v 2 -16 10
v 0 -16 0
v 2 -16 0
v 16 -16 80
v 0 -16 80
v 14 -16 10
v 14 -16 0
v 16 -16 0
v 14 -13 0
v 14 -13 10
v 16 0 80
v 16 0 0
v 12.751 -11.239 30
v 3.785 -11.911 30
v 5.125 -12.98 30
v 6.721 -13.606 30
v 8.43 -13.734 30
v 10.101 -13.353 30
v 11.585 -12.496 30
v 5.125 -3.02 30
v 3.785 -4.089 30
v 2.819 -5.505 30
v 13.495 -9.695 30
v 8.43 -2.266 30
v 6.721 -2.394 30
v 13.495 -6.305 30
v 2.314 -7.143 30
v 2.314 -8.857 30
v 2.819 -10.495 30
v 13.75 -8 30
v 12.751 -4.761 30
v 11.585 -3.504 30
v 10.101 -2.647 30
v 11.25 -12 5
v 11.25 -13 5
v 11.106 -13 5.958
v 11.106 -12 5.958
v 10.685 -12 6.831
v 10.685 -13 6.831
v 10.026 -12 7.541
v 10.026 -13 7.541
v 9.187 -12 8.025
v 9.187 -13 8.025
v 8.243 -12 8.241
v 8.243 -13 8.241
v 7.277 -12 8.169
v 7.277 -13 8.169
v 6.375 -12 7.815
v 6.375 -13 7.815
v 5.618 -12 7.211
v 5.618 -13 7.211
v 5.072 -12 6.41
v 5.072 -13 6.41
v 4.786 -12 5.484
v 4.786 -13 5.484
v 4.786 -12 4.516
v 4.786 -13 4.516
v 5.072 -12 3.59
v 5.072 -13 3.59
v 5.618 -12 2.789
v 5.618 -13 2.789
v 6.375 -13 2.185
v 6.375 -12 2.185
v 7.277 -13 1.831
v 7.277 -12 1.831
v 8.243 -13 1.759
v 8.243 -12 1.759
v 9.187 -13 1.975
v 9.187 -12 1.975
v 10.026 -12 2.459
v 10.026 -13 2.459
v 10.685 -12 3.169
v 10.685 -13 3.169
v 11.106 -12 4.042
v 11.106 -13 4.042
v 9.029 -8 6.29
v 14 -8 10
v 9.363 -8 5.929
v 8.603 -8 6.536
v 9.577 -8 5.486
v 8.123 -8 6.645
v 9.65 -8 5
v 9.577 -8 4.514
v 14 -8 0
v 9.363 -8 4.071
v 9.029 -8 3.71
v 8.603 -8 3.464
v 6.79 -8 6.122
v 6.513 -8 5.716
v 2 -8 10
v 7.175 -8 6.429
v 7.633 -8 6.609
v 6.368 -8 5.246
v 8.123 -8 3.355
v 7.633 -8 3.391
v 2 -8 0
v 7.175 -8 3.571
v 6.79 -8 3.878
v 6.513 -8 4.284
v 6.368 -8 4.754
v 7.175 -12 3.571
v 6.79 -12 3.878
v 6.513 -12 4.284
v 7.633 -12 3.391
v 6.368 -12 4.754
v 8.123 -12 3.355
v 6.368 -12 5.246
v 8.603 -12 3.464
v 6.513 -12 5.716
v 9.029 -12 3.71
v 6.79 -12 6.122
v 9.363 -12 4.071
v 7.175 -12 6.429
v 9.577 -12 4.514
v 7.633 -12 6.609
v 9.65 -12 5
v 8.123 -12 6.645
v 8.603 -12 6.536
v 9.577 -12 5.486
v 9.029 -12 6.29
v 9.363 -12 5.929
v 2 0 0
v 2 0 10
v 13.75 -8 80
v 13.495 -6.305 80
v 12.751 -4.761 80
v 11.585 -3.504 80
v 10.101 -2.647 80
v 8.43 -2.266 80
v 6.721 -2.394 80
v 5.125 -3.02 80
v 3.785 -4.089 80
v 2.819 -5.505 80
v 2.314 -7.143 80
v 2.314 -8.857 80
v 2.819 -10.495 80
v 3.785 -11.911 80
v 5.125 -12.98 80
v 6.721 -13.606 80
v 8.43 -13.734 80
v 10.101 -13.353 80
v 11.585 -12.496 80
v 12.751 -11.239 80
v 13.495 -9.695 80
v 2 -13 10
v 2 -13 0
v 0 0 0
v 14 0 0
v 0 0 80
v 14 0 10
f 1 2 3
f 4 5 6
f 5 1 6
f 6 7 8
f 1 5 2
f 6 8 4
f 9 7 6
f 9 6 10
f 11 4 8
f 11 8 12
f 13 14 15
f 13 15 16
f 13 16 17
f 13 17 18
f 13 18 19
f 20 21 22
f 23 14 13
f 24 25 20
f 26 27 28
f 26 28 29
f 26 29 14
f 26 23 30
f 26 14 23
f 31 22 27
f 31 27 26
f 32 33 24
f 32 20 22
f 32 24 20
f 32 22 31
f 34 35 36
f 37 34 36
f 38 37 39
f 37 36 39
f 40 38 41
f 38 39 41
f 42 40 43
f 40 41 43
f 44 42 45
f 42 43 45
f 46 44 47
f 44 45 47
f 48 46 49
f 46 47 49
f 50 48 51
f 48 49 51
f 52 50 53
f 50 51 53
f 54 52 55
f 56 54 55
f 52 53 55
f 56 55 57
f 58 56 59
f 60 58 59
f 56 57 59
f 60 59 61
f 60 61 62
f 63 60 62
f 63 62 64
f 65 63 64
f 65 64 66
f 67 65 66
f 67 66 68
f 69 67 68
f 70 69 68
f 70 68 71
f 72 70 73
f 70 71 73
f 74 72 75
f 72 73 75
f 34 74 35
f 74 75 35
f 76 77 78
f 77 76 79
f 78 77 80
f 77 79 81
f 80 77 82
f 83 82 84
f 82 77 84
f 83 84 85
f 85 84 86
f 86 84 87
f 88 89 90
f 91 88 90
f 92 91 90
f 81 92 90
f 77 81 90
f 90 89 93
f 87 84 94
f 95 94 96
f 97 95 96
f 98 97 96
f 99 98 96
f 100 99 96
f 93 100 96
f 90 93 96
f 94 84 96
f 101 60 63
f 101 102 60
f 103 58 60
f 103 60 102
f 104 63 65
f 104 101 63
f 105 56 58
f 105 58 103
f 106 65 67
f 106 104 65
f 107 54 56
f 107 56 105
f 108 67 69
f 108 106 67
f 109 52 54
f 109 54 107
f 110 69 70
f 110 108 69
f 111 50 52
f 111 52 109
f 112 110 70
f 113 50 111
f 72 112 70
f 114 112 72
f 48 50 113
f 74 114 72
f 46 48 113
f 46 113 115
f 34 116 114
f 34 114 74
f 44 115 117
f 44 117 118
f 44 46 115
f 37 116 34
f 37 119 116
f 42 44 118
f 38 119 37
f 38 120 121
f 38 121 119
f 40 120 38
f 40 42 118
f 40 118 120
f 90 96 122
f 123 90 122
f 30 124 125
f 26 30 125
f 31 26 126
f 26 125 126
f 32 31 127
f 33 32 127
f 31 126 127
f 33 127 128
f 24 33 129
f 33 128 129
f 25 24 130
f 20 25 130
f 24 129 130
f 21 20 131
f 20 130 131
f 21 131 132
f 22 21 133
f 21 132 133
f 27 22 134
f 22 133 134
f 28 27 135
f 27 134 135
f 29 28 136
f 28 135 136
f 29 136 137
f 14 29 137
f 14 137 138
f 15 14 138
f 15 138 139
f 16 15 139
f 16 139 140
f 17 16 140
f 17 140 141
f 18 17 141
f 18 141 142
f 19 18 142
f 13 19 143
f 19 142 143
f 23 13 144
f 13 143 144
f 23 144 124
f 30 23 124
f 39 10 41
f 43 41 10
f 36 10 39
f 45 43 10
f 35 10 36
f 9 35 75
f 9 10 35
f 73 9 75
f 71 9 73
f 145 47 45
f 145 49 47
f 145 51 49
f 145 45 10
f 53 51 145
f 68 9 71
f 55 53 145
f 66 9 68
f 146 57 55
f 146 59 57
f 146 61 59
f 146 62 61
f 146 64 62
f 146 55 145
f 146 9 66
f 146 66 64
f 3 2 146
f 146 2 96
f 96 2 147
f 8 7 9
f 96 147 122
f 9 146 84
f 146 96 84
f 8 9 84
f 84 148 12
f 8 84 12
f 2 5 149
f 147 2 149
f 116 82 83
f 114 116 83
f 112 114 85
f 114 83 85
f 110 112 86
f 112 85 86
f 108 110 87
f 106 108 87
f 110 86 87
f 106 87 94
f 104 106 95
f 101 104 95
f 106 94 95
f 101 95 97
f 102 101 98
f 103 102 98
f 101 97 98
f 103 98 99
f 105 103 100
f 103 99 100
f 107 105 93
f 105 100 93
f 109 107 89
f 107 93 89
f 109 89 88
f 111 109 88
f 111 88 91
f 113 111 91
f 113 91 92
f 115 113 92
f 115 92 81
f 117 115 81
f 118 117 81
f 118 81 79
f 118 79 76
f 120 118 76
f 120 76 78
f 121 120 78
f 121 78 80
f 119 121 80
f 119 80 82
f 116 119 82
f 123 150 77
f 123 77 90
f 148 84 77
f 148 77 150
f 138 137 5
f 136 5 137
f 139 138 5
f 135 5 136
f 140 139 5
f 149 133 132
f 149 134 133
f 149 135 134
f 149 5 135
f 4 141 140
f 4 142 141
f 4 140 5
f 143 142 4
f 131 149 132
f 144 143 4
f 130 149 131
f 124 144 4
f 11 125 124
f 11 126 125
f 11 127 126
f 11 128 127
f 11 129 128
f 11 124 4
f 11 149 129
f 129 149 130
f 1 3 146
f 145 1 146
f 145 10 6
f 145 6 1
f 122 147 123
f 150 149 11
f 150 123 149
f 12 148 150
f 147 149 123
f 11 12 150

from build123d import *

# Parameters (mm, degrees)
SKETCH_1_W             = 16
SKETCH_1_H             = 16
EXTRUDE_1_DEPTH        = 80
SKETCH_2_R             = 5.75
CUT_EXTRUDE_1_DEPTH    = 50
SKETCH_10_W            = 12
SKETCH_10_H            = 8
SKETCH_10_H_2          = 3
CUT_EXTRUDE_2_DEPTH    = 10
SKETCH_11_R            = 3.25
CUT_EXTRUDE_5_DEPTH    = 1
HOLE_WIZARD_M4_1_D     = 3.3
HOLE_WIZARD_M4_1_DEPTH = 4


with BuildPart() as part:
    # 草图1 → 凸台-拉伸1 (new body)
    with BuildSketch(Plane.XY):
        with Locations((8, -8)):
            Rectangle(SKETCH_1_W, SKETCH_1_H)
    extrude(amount=EXTRUDE_1_DEPTH)

    # 草图2 → 切除-拉伸1 (cut)
    with BuildSketch(Plane.XY.offset(80)):
        with Locations((8, -8)):
            Circle(SKETCH_2_R)
    extrude(amount=-CUT_EXTRUDE_1_DEPTH, mode=Mode.SUBTRACT)

    # 草图10 → 切除-拉伸2 (cut)
    with BuildSketch(Plane(origin=(0, 0, 0), x_dir=(-1, 0, 0), z_dir=(0, 0, -1))):
        with Locations((-8, -4)):
            Rectangle(SKETCH_10_W, SKETCH_10_H)
        with Locations((-8, -14.5)):
            Rectangle(SKETCH_10_W, SKETCH_10_H_2)
    extrude(amount=-CUT_EXTRUDE_2_DEPTH, mode=Mode.SUBTRACT)

    # 草图11 → 切除-拉伸5 (cut)
    with BuildSketch(Plane.XZ.offset(13)):
        with Locations((8, 5)):
            Circle(SKETCH_11_R)
    extrude(amount=-CUT_EXTRUDE_5_DEPTH, mode=Mode.SUBTRACT)

    # M4 螺纹孔的螺纹孔钻头1
    with Locations(Plane(origin=(0, -12, 0), x_dir=(-1, 0, 0), z_dir=(0, -1, 0))):
        with Locations((-8, -5)):
            Hole(HOLE_WIZARD_M4_1_D / 2, depth=HOLE_WIZARD_M4_1_DEPTH)


solid = part.part
